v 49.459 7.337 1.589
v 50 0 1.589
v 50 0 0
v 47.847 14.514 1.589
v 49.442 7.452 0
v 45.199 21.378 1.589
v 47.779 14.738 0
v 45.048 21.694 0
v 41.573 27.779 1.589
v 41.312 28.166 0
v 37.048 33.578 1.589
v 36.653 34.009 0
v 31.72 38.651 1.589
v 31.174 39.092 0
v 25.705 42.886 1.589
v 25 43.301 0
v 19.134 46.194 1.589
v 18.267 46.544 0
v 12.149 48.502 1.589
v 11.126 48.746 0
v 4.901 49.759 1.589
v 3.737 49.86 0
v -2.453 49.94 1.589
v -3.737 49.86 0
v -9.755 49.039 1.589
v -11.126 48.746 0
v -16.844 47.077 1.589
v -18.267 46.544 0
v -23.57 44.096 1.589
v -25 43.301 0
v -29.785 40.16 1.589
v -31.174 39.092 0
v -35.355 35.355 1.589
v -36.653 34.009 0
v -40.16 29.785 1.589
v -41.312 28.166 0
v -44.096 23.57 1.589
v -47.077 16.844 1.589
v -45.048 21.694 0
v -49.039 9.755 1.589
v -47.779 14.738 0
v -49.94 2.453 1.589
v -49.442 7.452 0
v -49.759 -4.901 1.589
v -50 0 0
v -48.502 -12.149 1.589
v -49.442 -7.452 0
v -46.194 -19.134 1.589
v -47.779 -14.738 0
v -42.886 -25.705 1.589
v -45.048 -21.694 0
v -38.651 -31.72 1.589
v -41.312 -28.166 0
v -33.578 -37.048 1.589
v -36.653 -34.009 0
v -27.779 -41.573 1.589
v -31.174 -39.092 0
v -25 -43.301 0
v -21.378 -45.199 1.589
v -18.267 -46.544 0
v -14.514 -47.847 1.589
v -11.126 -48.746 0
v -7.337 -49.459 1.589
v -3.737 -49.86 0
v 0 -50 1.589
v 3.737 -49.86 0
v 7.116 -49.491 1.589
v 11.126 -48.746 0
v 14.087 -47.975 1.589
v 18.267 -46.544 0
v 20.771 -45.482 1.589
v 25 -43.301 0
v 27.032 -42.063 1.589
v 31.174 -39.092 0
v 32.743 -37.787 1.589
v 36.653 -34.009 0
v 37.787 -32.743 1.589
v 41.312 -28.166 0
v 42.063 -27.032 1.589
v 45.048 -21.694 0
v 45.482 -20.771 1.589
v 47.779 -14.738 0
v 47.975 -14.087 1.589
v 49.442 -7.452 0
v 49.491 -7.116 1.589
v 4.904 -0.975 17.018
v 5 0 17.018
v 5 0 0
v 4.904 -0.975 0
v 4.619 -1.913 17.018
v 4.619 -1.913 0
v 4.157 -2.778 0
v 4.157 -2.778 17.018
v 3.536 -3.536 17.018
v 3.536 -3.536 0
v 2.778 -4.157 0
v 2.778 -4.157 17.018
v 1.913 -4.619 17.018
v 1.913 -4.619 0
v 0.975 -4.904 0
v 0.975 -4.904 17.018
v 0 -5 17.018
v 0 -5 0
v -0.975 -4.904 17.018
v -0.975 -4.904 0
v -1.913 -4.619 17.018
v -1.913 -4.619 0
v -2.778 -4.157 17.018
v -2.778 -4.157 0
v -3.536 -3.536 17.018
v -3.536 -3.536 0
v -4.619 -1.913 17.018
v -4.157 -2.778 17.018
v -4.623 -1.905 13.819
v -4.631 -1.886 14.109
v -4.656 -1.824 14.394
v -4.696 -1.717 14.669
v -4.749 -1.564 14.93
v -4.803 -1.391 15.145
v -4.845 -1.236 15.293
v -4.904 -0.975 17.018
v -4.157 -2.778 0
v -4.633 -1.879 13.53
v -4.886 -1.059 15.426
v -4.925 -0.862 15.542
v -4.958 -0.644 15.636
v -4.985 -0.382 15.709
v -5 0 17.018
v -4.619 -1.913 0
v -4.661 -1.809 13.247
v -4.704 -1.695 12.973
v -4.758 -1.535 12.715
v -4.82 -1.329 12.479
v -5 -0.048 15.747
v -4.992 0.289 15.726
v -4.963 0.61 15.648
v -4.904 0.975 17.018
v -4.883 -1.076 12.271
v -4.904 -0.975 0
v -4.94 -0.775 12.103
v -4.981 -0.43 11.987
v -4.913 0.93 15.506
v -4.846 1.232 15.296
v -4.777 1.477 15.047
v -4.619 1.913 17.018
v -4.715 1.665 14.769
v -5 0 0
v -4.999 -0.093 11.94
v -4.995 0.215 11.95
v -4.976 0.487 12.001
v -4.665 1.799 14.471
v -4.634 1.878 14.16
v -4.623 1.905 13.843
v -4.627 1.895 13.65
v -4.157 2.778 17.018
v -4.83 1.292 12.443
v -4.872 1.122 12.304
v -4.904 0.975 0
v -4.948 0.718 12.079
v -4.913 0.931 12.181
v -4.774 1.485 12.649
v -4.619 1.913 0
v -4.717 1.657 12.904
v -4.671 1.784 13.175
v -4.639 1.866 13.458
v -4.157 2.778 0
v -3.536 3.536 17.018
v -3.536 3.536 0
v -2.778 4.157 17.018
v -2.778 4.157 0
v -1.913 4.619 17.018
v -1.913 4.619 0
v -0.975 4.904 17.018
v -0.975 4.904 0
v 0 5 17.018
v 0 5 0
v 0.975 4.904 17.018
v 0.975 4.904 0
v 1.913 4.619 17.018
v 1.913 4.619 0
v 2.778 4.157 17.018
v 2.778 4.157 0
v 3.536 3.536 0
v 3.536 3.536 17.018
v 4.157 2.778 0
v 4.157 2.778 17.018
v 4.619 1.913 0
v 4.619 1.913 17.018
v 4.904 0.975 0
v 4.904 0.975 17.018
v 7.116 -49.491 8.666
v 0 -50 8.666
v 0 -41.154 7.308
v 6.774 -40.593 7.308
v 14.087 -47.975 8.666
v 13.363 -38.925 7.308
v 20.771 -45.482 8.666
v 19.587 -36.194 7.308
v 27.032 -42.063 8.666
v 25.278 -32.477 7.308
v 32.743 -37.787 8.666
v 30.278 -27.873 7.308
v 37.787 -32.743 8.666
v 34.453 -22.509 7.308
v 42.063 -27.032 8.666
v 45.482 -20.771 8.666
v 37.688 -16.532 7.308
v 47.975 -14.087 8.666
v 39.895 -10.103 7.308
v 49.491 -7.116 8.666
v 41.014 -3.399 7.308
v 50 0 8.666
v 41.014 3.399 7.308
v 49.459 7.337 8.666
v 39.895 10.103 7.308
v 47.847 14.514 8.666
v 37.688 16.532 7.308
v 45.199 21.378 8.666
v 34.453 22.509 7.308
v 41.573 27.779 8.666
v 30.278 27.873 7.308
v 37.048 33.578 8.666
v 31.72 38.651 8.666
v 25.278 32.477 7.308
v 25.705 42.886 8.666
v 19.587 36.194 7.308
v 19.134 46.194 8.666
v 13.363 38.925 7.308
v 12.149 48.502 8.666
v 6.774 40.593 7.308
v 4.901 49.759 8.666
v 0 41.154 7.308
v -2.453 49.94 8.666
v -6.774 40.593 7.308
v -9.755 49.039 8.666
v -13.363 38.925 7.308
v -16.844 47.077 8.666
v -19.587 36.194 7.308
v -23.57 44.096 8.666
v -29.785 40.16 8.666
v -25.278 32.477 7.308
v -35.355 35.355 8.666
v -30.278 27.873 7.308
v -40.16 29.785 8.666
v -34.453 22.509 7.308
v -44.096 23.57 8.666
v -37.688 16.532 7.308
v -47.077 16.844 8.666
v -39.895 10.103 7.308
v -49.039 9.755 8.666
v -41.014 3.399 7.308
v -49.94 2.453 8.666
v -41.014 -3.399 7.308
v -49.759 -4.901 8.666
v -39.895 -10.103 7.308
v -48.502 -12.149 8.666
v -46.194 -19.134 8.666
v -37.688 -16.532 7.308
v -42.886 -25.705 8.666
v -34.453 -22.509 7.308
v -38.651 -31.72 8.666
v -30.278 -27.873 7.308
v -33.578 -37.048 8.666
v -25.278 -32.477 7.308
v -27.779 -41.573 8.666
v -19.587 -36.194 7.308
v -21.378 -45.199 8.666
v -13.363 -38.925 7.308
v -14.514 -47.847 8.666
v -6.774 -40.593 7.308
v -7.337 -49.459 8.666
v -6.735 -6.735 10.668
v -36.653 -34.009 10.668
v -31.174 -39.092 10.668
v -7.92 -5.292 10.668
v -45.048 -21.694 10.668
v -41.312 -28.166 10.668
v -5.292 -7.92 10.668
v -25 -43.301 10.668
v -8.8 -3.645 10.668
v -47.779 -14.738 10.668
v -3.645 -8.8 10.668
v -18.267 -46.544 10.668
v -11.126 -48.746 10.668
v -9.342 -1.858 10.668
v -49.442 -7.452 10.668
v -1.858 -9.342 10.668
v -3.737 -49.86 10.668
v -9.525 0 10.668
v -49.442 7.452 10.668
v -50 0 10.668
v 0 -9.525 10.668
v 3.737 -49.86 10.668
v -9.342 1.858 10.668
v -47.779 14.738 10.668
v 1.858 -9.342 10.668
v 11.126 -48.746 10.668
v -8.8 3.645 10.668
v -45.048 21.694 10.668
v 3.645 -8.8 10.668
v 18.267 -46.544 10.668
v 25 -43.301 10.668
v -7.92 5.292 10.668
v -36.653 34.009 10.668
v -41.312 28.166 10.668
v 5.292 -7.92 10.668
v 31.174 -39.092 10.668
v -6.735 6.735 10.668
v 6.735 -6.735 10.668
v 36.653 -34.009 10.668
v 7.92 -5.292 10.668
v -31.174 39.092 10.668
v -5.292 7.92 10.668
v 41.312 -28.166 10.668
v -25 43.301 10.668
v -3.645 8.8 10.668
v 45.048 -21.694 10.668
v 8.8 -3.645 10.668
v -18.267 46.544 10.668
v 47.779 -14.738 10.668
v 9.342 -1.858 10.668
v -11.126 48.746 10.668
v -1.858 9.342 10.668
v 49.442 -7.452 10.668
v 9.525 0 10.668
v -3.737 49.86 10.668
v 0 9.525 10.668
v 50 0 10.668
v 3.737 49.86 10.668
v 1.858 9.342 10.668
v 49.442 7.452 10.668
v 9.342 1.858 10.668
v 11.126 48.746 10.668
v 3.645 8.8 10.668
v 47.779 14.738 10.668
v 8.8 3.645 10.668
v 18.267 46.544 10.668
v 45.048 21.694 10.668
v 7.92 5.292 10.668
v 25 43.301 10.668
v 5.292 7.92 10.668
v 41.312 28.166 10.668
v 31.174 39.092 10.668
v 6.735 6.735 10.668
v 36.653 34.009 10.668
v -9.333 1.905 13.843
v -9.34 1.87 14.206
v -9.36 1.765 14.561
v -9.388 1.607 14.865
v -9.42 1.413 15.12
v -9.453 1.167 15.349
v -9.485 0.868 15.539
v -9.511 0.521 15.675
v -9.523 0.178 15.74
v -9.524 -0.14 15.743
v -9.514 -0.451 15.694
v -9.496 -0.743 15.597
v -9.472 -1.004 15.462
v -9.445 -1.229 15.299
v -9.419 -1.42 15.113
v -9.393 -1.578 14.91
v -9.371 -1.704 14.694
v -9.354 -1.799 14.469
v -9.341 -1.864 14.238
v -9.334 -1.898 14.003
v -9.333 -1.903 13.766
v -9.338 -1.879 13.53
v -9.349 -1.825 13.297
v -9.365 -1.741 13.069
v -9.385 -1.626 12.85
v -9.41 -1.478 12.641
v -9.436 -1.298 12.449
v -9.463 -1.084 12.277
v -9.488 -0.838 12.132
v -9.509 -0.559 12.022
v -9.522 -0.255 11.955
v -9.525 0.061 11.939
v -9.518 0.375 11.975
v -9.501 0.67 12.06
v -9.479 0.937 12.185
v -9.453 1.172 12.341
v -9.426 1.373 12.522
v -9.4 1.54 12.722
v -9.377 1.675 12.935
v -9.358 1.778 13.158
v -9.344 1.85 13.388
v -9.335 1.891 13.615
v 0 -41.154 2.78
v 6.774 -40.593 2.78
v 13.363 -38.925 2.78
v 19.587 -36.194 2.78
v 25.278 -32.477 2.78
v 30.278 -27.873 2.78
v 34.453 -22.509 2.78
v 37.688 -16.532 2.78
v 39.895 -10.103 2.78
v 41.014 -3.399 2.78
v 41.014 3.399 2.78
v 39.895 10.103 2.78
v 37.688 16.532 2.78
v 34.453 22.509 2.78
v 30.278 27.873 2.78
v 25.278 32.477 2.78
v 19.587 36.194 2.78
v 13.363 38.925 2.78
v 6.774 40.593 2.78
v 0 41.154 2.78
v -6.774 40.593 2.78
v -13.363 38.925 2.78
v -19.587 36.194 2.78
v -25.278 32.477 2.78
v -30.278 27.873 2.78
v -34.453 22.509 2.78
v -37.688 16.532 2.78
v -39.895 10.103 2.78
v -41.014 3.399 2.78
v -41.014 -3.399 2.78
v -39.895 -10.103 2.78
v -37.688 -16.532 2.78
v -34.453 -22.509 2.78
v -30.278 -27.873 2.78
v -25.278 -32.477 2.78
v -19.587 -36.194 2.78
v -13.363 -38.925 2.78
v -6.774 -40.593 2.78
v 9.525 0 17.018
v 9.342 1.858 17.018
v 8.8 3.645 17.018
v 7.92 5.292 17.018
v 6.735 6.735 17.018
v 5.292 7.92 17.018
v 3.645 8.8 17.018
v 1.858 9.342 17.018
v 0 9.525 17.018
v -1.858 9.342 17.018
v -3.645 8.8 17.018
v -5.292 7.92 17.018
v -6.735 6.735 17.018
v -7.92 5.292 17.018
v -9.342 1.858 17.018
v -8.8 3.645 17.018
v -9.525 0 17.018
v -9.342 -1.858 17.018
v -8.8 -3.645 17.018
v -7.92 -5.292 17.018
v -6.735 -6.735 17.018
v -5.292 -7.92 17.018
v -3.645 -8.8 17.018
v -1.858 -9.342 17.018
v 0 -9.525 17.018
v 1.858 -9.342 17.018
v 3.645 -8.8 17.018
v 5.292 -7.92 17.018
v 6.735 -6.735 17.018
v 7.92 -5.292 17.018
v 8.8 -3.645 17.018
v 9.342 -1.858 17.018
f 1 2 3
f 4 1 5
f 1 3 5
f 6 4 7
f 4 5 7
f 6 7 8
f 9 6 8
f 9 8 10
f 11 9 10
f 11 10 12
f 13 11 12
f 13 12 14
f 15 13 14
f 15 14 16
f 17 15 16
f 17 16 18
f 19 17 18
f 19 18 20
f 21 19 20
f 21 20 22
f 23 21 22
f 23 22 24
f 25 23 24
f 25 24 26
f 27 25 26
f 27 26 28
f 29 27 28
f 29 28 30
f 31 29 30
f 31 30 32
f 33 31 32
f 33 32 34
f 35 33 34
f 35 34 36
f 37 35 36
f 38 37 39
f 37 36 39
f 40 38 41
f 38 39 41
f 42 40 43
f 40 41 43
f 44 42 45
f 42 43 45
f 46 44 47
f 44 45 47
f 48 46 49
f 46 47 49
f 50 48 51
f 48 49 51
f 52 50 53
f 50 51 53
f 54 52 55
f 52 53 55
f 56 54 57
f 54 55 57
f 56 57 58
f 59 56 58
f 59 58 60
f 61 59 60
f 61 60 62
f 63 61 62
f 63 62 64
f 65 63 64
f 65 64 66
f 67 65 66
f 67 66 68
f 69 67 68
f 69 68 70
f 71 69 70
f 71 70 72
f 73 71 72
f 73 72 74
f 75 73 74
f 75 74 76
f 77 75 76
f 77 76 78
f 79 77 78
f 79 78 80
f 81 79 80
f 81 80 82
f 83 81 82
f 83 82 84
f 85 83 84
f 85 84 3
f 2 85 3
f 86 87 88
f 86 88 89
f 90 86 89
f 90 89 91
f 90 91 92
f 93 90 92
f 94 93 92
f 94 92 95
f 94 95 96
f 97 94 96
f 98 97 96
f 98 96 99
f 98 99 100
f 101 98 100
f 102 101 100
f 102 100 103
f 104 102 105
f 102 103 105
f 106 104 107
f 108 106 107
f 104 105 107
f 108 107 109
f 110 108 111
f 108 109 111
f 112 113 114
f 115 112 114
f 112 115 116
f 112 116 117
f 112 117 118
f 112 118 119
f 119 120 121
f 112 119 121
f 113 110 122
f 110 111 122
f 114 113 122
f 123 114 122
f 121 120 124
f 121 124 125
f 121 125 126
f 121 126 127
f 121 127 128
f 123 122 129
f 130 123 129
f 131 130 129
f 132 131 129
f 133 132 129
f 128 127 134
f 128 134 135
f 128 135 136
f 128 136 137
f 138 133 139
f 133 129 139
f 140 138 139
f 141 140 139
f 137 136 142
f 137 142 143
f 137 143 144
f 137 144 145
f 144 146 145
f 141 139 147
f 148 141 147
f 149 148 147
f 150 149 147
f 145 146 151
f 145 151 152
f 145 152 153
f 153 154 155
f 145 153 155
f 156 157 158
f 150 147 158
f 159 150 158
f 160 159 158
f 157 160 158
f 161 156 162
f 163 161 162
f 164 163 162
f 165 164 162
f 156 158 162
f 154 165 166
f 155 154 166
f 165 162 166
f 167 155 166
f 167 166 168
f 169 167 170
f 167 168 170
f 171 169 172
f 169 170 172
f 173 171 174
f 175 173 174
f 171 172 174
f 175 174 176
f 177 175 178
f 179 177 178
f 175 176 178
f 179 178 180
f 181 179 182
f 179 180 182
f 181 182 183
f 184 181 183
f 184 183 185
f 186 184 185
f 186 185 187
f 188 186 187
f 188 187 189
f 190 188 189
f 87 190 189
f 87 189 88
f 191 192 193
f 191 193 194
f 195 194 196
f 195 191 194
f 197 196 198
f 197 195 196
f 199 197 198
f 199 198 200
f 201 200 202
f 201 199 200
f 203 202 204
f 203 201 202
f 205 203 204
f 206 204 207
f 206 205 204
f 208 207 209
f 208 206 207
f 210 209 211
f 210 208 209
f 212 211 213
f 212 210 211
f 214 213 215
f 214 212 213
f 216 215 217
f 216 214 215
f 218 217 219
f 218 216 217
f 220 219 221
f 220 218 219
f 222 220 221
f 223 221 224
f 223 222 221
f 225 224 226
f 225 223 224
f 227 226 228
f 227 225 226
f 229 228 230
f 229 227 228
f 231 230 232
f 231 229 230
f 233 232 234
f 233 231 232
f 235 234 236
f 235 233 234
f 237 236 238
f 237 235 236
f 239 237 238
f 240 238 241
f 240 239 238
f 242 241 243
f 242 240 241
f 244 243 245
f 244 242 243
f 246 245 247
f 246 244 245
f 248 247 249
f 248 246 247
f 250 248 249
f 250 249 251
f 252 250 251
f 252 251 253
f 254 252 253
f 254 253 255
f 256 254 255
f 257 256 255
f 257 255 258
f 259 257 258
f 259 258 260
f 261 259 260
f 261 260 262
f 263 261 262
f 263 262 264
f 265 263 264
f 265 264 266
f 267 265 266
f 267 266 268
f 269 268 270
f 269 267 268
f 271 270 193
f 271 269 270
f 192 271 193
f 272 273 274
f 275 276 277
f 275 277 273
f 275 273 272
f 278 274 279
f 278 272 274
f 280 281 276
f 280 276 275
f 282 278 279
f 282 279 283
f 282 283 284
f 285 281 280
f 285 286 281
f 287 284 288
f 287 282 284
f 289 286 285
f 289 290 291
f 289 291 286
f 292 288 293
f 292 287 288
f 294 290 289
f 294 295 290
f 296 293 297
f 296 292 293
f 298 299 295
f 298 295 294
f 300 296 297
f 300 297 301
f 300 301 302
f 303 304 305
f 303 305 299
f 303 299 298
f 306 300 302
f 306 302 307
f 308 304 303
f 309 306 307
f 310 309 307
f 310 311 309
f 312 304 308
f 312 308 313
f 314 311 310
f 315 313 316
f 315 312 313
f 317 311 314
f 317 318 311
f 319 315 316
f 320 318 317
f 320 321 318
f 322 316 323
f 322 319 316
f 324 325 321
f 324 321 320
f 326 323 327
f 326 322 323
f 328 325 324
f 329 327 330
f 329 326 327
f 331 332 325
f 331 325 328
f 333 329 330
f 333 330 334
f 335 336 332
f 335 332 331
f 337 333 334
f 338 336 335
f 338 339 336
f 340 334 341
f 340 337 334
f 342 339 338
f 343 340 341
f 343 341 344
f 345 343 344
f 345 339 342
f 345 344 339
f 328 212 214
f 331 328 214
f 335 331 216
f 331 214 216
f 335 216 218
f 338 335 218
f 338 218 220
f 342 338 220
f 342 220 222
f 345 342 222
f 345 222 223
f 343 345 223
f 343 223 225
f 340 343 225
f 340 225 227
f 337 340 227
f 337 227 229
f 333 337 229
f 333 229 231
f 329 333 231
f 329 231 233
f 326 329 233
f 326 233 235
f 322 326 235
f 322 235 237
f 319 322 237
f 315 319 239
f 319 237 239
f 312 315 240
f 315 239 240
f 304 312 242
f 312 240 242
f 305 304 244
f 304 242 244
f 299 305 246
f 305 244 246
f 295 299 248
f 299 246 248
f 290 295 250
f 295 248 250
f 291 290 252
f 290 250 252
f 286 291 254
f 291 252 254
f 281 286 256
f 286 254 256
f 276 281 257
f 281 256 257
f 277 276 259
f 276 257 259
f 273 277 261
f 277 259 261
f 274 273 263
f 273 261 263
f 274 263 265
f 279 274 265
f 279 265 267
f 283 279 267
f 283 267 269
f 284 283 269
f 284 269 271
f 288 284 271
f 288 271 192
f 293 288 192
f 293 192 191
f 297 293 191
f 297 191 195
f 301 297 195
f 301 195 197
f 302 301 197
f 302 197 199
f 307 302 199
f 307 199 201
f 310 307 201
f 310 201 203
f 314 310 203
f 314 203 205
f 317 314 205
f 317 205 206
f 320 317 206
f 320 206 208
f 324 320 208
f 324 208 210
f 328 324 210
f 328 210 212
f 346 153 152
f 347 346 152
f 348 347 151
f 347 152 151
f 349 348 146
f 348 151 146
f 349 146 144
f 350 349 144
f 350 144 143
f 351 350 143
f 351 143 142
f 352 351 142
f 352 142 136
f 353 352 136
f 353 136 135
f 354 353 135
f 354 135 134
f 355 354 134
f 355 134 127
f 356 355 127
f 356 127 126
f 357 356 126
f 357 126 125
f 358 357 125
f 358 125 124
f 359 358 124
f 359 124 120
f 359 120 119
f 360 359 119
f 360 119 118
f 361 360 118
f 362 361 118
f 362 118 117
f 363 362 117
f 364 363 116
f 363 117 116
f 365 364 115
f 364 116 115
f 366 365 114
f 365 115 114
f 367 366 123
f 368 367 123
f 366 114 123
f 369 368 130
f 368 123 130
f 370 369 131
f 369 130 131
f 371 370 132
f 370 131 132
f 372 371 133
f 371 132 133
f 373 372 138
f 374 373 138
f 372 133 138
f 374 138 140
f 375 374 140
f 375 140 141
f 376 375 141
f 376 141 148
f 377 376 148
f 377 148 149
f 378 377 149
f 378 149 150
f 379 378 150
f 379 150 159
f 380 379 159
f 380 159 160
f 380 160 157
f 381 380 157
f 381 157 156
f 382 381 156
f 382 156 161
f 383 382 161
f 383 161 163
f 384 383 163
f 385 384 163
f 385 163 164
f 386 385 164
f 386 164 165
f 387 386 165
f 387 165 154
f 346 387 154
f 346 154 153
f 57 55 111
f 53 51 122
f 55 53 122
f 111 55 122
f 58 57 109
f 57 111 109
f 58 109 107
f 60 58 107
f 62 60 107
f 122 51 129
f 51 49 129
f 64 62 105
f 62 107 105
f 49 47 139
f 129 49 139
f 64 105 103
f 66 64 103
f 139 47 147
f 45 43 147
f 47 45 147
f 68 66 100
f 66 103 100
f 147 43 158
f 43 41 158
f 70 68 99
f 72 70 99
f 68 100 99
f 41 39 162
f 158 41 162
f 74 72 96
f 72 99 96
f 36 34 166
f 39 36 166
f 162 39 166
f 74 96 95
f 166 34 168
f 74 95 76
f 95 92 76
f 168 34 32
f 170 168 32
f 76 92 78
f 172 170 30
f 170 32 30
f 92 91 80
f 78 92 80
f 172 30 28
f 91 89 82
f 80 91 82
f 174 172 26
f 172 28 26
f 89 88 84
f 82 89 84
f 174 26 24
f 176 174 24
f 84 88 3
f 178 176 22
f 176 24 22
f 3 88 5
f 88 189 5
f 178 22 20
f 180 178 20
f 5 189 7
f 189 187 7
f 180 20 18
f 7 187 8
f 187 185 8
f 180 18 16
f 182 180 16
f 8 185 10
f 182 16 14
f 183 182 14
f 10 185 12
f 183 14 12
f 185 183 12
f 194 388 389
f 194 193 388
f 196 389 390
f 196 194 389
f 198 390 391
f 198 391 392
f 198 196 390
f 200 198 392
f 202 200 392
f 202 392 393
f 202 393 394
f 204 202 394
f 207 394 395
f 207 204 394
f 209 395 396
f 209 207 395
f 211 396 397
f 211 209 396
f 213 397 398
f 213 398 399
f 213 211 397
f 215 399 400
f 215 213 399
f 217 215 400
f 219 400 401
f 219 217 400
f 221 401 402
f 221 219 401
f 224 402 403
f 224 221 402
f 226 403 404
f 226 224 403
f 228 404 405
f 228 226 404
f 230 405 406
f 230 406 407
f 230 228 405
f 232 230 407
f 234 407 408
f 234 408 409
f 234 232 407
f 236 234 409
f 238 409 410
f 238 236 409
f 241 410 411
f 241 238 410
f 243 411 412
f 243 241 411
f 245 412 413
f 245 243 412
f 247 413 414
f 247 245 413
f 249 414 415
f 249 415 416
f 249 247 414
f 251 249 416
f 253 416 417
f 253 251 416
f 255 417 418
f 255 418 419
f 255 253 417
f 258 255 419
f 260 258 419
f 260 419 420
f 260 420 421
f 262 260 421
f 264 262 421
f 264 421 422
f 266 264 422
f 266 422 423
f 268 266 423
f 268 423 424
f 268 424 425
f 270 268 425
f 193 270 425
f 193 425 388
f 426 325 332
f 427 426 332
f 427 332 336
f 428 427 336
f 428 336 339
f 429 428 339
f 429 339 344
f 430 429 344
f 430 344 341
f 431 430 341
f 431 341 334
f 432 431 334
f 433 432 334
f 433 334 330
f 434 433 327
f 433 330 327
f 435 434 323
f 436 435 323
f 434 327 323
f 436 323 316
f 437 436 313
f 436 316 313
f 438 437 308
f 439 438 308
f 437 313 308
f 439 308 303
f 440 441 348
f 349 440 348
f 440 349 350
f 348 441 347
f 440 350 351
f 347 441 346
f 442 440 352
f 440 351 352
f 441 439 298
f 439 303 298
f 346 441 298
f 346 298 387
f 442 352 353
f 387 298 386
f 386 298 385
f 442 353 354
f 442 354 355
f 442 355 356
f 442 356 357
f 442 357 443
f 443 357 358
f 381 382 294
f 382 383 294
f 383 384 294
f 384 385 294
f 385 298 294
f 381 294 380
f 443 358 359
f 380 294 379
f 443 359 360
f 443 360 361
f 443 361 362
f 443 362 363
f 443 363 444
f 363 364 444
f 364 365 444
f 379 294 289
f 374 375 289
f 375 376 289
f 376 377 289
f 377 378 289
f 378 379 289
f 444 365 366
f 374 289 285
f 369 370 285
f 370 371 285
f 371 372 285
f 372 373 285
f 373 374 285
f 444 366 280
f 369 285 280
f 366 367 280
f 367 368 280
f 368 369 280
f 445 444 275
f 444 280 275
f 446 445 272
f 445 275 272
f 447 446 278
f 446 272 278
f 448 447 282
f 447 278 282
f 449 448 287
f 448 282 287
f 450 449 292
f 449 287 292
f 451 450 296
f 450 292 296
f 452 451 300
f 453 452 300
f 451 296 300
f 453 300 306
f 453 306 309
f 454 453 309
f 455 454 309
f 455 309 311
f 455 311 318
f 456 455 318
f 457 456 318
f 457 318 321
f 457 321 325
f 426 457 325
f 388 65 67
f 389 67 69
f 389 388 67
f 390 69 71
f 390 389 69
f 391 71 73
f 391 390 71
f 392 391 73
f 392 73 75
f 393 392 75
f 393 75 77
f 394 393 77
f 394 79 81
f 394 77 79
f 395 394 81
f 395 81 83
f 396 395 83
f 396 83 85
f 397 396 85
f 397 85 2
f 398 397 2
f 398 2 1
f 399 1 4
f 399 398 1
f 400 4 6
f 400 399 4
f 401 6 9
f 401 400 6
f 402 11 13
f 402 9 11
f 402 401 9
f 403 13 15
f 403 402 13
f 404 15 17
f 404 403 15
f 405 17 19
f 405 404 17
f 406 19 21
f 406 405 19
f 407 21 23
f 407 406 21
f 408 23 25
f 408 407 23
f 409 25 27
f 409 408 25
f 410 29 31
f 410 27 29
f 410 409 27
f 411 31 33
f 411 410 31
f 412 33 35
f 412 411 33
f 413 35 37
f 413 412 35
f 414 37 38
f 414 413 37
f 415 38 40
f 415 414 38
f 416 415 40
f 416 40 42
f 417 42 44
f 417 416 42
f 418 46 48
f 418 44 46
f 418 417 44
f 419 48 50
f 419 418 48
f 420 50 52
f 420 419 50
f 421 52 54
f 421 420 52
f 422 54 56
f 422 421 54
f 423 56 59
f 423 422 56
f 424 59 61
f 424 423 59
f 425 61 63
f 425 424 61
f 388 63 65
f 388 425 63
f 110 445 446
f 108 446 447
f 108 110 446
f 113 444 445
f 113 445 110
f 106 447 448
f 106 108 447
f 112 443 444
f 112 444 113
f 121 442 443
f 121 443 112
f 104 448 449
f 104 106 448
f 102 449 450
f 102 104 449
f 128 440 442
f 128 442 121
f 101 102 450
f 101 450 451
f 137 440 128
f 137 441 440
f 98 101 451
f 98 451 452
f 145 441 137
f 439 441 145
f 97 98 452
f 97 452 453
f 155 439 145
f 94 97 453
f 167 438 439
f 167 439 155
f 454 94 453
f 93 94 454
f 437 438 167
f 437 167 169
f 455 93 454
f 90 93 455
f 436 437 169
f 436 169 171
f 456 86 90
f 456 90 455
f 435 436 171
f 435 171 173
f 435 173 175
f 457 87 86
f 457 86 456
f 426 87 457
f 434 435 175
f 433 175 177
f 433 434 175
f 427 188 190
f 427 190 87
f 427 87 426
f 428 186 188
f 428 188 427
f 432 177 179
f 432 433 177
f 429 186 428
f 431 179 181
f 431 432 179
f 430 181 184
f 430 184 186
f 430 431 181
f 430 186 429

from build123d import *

# Parameters (mm, degrees)
F0_R     = 50
F1_DEPTH = 10.668
F2_R     = 9.525
F3_DEPTH = 6.35
F4_R     = 1.905
F5_DEPTH = 25.4
F6_R     = 5
F7_DEPTH = 101.6


with BuildPart() as f1:
    # F0 (on Top) → F1 (new body)
    with BuildSketch(Plane.XY):
        Circle(F0_R)
    extrude(amount=F1_DEPTH)

    # F2 (on face) → F3 (join)
    with BuildSketch(Plane.XY.offset(10.668)):
        Circle(F2_R)
    extrude(amount=F3_DEPTH)

    # F4 (on Right) → F5 (cut)
    with BuildSketch(Plane.YZ):
        with Locations((0, 13.843)):
            Circle(F4_R)
    extrude(amount=-F5_DEPTH, mode=Mode.SUBTRACT)

    # F6 (on face) → F7 (cut)
    with BuildSketch(Plane(origin=(0, 0, 0), x_dir=(1, 0, 0), z_dir=(0, 0, -1))):
        Circle(F6_R)
    extrude(amount=-F7_DEPTH, mode=Mode.SUBTRACT)

    # F8 (on Right) → F9 (revolve, cut)
    with BuildSketch(Plane.YZ):
        with BuildLine():
            Line((-50.066398, 8.67579), (-50.066398, 7.502463))
            ThreePointArc((-50.066398, 7.502463), (-51.774357, 5.118554), (-50.042302, 2.752094))
            Line((-50.042302, 2.752094), (-50.042302, 1.583694))
            Line((-50.042302, 1.583694), (-41.154411, 2.780473))
            Line((-41.154411, 2.780473), (-41.154411, 7.307734))
            Line((-41.154411, 7.307734), (-50.066398, 8.67579))
        make_face()
    revolve(axis=Axis((0, 0, 17.018), (0, 0, 1)), mode=Mode.SUBTRACT)


solid = f1.part
